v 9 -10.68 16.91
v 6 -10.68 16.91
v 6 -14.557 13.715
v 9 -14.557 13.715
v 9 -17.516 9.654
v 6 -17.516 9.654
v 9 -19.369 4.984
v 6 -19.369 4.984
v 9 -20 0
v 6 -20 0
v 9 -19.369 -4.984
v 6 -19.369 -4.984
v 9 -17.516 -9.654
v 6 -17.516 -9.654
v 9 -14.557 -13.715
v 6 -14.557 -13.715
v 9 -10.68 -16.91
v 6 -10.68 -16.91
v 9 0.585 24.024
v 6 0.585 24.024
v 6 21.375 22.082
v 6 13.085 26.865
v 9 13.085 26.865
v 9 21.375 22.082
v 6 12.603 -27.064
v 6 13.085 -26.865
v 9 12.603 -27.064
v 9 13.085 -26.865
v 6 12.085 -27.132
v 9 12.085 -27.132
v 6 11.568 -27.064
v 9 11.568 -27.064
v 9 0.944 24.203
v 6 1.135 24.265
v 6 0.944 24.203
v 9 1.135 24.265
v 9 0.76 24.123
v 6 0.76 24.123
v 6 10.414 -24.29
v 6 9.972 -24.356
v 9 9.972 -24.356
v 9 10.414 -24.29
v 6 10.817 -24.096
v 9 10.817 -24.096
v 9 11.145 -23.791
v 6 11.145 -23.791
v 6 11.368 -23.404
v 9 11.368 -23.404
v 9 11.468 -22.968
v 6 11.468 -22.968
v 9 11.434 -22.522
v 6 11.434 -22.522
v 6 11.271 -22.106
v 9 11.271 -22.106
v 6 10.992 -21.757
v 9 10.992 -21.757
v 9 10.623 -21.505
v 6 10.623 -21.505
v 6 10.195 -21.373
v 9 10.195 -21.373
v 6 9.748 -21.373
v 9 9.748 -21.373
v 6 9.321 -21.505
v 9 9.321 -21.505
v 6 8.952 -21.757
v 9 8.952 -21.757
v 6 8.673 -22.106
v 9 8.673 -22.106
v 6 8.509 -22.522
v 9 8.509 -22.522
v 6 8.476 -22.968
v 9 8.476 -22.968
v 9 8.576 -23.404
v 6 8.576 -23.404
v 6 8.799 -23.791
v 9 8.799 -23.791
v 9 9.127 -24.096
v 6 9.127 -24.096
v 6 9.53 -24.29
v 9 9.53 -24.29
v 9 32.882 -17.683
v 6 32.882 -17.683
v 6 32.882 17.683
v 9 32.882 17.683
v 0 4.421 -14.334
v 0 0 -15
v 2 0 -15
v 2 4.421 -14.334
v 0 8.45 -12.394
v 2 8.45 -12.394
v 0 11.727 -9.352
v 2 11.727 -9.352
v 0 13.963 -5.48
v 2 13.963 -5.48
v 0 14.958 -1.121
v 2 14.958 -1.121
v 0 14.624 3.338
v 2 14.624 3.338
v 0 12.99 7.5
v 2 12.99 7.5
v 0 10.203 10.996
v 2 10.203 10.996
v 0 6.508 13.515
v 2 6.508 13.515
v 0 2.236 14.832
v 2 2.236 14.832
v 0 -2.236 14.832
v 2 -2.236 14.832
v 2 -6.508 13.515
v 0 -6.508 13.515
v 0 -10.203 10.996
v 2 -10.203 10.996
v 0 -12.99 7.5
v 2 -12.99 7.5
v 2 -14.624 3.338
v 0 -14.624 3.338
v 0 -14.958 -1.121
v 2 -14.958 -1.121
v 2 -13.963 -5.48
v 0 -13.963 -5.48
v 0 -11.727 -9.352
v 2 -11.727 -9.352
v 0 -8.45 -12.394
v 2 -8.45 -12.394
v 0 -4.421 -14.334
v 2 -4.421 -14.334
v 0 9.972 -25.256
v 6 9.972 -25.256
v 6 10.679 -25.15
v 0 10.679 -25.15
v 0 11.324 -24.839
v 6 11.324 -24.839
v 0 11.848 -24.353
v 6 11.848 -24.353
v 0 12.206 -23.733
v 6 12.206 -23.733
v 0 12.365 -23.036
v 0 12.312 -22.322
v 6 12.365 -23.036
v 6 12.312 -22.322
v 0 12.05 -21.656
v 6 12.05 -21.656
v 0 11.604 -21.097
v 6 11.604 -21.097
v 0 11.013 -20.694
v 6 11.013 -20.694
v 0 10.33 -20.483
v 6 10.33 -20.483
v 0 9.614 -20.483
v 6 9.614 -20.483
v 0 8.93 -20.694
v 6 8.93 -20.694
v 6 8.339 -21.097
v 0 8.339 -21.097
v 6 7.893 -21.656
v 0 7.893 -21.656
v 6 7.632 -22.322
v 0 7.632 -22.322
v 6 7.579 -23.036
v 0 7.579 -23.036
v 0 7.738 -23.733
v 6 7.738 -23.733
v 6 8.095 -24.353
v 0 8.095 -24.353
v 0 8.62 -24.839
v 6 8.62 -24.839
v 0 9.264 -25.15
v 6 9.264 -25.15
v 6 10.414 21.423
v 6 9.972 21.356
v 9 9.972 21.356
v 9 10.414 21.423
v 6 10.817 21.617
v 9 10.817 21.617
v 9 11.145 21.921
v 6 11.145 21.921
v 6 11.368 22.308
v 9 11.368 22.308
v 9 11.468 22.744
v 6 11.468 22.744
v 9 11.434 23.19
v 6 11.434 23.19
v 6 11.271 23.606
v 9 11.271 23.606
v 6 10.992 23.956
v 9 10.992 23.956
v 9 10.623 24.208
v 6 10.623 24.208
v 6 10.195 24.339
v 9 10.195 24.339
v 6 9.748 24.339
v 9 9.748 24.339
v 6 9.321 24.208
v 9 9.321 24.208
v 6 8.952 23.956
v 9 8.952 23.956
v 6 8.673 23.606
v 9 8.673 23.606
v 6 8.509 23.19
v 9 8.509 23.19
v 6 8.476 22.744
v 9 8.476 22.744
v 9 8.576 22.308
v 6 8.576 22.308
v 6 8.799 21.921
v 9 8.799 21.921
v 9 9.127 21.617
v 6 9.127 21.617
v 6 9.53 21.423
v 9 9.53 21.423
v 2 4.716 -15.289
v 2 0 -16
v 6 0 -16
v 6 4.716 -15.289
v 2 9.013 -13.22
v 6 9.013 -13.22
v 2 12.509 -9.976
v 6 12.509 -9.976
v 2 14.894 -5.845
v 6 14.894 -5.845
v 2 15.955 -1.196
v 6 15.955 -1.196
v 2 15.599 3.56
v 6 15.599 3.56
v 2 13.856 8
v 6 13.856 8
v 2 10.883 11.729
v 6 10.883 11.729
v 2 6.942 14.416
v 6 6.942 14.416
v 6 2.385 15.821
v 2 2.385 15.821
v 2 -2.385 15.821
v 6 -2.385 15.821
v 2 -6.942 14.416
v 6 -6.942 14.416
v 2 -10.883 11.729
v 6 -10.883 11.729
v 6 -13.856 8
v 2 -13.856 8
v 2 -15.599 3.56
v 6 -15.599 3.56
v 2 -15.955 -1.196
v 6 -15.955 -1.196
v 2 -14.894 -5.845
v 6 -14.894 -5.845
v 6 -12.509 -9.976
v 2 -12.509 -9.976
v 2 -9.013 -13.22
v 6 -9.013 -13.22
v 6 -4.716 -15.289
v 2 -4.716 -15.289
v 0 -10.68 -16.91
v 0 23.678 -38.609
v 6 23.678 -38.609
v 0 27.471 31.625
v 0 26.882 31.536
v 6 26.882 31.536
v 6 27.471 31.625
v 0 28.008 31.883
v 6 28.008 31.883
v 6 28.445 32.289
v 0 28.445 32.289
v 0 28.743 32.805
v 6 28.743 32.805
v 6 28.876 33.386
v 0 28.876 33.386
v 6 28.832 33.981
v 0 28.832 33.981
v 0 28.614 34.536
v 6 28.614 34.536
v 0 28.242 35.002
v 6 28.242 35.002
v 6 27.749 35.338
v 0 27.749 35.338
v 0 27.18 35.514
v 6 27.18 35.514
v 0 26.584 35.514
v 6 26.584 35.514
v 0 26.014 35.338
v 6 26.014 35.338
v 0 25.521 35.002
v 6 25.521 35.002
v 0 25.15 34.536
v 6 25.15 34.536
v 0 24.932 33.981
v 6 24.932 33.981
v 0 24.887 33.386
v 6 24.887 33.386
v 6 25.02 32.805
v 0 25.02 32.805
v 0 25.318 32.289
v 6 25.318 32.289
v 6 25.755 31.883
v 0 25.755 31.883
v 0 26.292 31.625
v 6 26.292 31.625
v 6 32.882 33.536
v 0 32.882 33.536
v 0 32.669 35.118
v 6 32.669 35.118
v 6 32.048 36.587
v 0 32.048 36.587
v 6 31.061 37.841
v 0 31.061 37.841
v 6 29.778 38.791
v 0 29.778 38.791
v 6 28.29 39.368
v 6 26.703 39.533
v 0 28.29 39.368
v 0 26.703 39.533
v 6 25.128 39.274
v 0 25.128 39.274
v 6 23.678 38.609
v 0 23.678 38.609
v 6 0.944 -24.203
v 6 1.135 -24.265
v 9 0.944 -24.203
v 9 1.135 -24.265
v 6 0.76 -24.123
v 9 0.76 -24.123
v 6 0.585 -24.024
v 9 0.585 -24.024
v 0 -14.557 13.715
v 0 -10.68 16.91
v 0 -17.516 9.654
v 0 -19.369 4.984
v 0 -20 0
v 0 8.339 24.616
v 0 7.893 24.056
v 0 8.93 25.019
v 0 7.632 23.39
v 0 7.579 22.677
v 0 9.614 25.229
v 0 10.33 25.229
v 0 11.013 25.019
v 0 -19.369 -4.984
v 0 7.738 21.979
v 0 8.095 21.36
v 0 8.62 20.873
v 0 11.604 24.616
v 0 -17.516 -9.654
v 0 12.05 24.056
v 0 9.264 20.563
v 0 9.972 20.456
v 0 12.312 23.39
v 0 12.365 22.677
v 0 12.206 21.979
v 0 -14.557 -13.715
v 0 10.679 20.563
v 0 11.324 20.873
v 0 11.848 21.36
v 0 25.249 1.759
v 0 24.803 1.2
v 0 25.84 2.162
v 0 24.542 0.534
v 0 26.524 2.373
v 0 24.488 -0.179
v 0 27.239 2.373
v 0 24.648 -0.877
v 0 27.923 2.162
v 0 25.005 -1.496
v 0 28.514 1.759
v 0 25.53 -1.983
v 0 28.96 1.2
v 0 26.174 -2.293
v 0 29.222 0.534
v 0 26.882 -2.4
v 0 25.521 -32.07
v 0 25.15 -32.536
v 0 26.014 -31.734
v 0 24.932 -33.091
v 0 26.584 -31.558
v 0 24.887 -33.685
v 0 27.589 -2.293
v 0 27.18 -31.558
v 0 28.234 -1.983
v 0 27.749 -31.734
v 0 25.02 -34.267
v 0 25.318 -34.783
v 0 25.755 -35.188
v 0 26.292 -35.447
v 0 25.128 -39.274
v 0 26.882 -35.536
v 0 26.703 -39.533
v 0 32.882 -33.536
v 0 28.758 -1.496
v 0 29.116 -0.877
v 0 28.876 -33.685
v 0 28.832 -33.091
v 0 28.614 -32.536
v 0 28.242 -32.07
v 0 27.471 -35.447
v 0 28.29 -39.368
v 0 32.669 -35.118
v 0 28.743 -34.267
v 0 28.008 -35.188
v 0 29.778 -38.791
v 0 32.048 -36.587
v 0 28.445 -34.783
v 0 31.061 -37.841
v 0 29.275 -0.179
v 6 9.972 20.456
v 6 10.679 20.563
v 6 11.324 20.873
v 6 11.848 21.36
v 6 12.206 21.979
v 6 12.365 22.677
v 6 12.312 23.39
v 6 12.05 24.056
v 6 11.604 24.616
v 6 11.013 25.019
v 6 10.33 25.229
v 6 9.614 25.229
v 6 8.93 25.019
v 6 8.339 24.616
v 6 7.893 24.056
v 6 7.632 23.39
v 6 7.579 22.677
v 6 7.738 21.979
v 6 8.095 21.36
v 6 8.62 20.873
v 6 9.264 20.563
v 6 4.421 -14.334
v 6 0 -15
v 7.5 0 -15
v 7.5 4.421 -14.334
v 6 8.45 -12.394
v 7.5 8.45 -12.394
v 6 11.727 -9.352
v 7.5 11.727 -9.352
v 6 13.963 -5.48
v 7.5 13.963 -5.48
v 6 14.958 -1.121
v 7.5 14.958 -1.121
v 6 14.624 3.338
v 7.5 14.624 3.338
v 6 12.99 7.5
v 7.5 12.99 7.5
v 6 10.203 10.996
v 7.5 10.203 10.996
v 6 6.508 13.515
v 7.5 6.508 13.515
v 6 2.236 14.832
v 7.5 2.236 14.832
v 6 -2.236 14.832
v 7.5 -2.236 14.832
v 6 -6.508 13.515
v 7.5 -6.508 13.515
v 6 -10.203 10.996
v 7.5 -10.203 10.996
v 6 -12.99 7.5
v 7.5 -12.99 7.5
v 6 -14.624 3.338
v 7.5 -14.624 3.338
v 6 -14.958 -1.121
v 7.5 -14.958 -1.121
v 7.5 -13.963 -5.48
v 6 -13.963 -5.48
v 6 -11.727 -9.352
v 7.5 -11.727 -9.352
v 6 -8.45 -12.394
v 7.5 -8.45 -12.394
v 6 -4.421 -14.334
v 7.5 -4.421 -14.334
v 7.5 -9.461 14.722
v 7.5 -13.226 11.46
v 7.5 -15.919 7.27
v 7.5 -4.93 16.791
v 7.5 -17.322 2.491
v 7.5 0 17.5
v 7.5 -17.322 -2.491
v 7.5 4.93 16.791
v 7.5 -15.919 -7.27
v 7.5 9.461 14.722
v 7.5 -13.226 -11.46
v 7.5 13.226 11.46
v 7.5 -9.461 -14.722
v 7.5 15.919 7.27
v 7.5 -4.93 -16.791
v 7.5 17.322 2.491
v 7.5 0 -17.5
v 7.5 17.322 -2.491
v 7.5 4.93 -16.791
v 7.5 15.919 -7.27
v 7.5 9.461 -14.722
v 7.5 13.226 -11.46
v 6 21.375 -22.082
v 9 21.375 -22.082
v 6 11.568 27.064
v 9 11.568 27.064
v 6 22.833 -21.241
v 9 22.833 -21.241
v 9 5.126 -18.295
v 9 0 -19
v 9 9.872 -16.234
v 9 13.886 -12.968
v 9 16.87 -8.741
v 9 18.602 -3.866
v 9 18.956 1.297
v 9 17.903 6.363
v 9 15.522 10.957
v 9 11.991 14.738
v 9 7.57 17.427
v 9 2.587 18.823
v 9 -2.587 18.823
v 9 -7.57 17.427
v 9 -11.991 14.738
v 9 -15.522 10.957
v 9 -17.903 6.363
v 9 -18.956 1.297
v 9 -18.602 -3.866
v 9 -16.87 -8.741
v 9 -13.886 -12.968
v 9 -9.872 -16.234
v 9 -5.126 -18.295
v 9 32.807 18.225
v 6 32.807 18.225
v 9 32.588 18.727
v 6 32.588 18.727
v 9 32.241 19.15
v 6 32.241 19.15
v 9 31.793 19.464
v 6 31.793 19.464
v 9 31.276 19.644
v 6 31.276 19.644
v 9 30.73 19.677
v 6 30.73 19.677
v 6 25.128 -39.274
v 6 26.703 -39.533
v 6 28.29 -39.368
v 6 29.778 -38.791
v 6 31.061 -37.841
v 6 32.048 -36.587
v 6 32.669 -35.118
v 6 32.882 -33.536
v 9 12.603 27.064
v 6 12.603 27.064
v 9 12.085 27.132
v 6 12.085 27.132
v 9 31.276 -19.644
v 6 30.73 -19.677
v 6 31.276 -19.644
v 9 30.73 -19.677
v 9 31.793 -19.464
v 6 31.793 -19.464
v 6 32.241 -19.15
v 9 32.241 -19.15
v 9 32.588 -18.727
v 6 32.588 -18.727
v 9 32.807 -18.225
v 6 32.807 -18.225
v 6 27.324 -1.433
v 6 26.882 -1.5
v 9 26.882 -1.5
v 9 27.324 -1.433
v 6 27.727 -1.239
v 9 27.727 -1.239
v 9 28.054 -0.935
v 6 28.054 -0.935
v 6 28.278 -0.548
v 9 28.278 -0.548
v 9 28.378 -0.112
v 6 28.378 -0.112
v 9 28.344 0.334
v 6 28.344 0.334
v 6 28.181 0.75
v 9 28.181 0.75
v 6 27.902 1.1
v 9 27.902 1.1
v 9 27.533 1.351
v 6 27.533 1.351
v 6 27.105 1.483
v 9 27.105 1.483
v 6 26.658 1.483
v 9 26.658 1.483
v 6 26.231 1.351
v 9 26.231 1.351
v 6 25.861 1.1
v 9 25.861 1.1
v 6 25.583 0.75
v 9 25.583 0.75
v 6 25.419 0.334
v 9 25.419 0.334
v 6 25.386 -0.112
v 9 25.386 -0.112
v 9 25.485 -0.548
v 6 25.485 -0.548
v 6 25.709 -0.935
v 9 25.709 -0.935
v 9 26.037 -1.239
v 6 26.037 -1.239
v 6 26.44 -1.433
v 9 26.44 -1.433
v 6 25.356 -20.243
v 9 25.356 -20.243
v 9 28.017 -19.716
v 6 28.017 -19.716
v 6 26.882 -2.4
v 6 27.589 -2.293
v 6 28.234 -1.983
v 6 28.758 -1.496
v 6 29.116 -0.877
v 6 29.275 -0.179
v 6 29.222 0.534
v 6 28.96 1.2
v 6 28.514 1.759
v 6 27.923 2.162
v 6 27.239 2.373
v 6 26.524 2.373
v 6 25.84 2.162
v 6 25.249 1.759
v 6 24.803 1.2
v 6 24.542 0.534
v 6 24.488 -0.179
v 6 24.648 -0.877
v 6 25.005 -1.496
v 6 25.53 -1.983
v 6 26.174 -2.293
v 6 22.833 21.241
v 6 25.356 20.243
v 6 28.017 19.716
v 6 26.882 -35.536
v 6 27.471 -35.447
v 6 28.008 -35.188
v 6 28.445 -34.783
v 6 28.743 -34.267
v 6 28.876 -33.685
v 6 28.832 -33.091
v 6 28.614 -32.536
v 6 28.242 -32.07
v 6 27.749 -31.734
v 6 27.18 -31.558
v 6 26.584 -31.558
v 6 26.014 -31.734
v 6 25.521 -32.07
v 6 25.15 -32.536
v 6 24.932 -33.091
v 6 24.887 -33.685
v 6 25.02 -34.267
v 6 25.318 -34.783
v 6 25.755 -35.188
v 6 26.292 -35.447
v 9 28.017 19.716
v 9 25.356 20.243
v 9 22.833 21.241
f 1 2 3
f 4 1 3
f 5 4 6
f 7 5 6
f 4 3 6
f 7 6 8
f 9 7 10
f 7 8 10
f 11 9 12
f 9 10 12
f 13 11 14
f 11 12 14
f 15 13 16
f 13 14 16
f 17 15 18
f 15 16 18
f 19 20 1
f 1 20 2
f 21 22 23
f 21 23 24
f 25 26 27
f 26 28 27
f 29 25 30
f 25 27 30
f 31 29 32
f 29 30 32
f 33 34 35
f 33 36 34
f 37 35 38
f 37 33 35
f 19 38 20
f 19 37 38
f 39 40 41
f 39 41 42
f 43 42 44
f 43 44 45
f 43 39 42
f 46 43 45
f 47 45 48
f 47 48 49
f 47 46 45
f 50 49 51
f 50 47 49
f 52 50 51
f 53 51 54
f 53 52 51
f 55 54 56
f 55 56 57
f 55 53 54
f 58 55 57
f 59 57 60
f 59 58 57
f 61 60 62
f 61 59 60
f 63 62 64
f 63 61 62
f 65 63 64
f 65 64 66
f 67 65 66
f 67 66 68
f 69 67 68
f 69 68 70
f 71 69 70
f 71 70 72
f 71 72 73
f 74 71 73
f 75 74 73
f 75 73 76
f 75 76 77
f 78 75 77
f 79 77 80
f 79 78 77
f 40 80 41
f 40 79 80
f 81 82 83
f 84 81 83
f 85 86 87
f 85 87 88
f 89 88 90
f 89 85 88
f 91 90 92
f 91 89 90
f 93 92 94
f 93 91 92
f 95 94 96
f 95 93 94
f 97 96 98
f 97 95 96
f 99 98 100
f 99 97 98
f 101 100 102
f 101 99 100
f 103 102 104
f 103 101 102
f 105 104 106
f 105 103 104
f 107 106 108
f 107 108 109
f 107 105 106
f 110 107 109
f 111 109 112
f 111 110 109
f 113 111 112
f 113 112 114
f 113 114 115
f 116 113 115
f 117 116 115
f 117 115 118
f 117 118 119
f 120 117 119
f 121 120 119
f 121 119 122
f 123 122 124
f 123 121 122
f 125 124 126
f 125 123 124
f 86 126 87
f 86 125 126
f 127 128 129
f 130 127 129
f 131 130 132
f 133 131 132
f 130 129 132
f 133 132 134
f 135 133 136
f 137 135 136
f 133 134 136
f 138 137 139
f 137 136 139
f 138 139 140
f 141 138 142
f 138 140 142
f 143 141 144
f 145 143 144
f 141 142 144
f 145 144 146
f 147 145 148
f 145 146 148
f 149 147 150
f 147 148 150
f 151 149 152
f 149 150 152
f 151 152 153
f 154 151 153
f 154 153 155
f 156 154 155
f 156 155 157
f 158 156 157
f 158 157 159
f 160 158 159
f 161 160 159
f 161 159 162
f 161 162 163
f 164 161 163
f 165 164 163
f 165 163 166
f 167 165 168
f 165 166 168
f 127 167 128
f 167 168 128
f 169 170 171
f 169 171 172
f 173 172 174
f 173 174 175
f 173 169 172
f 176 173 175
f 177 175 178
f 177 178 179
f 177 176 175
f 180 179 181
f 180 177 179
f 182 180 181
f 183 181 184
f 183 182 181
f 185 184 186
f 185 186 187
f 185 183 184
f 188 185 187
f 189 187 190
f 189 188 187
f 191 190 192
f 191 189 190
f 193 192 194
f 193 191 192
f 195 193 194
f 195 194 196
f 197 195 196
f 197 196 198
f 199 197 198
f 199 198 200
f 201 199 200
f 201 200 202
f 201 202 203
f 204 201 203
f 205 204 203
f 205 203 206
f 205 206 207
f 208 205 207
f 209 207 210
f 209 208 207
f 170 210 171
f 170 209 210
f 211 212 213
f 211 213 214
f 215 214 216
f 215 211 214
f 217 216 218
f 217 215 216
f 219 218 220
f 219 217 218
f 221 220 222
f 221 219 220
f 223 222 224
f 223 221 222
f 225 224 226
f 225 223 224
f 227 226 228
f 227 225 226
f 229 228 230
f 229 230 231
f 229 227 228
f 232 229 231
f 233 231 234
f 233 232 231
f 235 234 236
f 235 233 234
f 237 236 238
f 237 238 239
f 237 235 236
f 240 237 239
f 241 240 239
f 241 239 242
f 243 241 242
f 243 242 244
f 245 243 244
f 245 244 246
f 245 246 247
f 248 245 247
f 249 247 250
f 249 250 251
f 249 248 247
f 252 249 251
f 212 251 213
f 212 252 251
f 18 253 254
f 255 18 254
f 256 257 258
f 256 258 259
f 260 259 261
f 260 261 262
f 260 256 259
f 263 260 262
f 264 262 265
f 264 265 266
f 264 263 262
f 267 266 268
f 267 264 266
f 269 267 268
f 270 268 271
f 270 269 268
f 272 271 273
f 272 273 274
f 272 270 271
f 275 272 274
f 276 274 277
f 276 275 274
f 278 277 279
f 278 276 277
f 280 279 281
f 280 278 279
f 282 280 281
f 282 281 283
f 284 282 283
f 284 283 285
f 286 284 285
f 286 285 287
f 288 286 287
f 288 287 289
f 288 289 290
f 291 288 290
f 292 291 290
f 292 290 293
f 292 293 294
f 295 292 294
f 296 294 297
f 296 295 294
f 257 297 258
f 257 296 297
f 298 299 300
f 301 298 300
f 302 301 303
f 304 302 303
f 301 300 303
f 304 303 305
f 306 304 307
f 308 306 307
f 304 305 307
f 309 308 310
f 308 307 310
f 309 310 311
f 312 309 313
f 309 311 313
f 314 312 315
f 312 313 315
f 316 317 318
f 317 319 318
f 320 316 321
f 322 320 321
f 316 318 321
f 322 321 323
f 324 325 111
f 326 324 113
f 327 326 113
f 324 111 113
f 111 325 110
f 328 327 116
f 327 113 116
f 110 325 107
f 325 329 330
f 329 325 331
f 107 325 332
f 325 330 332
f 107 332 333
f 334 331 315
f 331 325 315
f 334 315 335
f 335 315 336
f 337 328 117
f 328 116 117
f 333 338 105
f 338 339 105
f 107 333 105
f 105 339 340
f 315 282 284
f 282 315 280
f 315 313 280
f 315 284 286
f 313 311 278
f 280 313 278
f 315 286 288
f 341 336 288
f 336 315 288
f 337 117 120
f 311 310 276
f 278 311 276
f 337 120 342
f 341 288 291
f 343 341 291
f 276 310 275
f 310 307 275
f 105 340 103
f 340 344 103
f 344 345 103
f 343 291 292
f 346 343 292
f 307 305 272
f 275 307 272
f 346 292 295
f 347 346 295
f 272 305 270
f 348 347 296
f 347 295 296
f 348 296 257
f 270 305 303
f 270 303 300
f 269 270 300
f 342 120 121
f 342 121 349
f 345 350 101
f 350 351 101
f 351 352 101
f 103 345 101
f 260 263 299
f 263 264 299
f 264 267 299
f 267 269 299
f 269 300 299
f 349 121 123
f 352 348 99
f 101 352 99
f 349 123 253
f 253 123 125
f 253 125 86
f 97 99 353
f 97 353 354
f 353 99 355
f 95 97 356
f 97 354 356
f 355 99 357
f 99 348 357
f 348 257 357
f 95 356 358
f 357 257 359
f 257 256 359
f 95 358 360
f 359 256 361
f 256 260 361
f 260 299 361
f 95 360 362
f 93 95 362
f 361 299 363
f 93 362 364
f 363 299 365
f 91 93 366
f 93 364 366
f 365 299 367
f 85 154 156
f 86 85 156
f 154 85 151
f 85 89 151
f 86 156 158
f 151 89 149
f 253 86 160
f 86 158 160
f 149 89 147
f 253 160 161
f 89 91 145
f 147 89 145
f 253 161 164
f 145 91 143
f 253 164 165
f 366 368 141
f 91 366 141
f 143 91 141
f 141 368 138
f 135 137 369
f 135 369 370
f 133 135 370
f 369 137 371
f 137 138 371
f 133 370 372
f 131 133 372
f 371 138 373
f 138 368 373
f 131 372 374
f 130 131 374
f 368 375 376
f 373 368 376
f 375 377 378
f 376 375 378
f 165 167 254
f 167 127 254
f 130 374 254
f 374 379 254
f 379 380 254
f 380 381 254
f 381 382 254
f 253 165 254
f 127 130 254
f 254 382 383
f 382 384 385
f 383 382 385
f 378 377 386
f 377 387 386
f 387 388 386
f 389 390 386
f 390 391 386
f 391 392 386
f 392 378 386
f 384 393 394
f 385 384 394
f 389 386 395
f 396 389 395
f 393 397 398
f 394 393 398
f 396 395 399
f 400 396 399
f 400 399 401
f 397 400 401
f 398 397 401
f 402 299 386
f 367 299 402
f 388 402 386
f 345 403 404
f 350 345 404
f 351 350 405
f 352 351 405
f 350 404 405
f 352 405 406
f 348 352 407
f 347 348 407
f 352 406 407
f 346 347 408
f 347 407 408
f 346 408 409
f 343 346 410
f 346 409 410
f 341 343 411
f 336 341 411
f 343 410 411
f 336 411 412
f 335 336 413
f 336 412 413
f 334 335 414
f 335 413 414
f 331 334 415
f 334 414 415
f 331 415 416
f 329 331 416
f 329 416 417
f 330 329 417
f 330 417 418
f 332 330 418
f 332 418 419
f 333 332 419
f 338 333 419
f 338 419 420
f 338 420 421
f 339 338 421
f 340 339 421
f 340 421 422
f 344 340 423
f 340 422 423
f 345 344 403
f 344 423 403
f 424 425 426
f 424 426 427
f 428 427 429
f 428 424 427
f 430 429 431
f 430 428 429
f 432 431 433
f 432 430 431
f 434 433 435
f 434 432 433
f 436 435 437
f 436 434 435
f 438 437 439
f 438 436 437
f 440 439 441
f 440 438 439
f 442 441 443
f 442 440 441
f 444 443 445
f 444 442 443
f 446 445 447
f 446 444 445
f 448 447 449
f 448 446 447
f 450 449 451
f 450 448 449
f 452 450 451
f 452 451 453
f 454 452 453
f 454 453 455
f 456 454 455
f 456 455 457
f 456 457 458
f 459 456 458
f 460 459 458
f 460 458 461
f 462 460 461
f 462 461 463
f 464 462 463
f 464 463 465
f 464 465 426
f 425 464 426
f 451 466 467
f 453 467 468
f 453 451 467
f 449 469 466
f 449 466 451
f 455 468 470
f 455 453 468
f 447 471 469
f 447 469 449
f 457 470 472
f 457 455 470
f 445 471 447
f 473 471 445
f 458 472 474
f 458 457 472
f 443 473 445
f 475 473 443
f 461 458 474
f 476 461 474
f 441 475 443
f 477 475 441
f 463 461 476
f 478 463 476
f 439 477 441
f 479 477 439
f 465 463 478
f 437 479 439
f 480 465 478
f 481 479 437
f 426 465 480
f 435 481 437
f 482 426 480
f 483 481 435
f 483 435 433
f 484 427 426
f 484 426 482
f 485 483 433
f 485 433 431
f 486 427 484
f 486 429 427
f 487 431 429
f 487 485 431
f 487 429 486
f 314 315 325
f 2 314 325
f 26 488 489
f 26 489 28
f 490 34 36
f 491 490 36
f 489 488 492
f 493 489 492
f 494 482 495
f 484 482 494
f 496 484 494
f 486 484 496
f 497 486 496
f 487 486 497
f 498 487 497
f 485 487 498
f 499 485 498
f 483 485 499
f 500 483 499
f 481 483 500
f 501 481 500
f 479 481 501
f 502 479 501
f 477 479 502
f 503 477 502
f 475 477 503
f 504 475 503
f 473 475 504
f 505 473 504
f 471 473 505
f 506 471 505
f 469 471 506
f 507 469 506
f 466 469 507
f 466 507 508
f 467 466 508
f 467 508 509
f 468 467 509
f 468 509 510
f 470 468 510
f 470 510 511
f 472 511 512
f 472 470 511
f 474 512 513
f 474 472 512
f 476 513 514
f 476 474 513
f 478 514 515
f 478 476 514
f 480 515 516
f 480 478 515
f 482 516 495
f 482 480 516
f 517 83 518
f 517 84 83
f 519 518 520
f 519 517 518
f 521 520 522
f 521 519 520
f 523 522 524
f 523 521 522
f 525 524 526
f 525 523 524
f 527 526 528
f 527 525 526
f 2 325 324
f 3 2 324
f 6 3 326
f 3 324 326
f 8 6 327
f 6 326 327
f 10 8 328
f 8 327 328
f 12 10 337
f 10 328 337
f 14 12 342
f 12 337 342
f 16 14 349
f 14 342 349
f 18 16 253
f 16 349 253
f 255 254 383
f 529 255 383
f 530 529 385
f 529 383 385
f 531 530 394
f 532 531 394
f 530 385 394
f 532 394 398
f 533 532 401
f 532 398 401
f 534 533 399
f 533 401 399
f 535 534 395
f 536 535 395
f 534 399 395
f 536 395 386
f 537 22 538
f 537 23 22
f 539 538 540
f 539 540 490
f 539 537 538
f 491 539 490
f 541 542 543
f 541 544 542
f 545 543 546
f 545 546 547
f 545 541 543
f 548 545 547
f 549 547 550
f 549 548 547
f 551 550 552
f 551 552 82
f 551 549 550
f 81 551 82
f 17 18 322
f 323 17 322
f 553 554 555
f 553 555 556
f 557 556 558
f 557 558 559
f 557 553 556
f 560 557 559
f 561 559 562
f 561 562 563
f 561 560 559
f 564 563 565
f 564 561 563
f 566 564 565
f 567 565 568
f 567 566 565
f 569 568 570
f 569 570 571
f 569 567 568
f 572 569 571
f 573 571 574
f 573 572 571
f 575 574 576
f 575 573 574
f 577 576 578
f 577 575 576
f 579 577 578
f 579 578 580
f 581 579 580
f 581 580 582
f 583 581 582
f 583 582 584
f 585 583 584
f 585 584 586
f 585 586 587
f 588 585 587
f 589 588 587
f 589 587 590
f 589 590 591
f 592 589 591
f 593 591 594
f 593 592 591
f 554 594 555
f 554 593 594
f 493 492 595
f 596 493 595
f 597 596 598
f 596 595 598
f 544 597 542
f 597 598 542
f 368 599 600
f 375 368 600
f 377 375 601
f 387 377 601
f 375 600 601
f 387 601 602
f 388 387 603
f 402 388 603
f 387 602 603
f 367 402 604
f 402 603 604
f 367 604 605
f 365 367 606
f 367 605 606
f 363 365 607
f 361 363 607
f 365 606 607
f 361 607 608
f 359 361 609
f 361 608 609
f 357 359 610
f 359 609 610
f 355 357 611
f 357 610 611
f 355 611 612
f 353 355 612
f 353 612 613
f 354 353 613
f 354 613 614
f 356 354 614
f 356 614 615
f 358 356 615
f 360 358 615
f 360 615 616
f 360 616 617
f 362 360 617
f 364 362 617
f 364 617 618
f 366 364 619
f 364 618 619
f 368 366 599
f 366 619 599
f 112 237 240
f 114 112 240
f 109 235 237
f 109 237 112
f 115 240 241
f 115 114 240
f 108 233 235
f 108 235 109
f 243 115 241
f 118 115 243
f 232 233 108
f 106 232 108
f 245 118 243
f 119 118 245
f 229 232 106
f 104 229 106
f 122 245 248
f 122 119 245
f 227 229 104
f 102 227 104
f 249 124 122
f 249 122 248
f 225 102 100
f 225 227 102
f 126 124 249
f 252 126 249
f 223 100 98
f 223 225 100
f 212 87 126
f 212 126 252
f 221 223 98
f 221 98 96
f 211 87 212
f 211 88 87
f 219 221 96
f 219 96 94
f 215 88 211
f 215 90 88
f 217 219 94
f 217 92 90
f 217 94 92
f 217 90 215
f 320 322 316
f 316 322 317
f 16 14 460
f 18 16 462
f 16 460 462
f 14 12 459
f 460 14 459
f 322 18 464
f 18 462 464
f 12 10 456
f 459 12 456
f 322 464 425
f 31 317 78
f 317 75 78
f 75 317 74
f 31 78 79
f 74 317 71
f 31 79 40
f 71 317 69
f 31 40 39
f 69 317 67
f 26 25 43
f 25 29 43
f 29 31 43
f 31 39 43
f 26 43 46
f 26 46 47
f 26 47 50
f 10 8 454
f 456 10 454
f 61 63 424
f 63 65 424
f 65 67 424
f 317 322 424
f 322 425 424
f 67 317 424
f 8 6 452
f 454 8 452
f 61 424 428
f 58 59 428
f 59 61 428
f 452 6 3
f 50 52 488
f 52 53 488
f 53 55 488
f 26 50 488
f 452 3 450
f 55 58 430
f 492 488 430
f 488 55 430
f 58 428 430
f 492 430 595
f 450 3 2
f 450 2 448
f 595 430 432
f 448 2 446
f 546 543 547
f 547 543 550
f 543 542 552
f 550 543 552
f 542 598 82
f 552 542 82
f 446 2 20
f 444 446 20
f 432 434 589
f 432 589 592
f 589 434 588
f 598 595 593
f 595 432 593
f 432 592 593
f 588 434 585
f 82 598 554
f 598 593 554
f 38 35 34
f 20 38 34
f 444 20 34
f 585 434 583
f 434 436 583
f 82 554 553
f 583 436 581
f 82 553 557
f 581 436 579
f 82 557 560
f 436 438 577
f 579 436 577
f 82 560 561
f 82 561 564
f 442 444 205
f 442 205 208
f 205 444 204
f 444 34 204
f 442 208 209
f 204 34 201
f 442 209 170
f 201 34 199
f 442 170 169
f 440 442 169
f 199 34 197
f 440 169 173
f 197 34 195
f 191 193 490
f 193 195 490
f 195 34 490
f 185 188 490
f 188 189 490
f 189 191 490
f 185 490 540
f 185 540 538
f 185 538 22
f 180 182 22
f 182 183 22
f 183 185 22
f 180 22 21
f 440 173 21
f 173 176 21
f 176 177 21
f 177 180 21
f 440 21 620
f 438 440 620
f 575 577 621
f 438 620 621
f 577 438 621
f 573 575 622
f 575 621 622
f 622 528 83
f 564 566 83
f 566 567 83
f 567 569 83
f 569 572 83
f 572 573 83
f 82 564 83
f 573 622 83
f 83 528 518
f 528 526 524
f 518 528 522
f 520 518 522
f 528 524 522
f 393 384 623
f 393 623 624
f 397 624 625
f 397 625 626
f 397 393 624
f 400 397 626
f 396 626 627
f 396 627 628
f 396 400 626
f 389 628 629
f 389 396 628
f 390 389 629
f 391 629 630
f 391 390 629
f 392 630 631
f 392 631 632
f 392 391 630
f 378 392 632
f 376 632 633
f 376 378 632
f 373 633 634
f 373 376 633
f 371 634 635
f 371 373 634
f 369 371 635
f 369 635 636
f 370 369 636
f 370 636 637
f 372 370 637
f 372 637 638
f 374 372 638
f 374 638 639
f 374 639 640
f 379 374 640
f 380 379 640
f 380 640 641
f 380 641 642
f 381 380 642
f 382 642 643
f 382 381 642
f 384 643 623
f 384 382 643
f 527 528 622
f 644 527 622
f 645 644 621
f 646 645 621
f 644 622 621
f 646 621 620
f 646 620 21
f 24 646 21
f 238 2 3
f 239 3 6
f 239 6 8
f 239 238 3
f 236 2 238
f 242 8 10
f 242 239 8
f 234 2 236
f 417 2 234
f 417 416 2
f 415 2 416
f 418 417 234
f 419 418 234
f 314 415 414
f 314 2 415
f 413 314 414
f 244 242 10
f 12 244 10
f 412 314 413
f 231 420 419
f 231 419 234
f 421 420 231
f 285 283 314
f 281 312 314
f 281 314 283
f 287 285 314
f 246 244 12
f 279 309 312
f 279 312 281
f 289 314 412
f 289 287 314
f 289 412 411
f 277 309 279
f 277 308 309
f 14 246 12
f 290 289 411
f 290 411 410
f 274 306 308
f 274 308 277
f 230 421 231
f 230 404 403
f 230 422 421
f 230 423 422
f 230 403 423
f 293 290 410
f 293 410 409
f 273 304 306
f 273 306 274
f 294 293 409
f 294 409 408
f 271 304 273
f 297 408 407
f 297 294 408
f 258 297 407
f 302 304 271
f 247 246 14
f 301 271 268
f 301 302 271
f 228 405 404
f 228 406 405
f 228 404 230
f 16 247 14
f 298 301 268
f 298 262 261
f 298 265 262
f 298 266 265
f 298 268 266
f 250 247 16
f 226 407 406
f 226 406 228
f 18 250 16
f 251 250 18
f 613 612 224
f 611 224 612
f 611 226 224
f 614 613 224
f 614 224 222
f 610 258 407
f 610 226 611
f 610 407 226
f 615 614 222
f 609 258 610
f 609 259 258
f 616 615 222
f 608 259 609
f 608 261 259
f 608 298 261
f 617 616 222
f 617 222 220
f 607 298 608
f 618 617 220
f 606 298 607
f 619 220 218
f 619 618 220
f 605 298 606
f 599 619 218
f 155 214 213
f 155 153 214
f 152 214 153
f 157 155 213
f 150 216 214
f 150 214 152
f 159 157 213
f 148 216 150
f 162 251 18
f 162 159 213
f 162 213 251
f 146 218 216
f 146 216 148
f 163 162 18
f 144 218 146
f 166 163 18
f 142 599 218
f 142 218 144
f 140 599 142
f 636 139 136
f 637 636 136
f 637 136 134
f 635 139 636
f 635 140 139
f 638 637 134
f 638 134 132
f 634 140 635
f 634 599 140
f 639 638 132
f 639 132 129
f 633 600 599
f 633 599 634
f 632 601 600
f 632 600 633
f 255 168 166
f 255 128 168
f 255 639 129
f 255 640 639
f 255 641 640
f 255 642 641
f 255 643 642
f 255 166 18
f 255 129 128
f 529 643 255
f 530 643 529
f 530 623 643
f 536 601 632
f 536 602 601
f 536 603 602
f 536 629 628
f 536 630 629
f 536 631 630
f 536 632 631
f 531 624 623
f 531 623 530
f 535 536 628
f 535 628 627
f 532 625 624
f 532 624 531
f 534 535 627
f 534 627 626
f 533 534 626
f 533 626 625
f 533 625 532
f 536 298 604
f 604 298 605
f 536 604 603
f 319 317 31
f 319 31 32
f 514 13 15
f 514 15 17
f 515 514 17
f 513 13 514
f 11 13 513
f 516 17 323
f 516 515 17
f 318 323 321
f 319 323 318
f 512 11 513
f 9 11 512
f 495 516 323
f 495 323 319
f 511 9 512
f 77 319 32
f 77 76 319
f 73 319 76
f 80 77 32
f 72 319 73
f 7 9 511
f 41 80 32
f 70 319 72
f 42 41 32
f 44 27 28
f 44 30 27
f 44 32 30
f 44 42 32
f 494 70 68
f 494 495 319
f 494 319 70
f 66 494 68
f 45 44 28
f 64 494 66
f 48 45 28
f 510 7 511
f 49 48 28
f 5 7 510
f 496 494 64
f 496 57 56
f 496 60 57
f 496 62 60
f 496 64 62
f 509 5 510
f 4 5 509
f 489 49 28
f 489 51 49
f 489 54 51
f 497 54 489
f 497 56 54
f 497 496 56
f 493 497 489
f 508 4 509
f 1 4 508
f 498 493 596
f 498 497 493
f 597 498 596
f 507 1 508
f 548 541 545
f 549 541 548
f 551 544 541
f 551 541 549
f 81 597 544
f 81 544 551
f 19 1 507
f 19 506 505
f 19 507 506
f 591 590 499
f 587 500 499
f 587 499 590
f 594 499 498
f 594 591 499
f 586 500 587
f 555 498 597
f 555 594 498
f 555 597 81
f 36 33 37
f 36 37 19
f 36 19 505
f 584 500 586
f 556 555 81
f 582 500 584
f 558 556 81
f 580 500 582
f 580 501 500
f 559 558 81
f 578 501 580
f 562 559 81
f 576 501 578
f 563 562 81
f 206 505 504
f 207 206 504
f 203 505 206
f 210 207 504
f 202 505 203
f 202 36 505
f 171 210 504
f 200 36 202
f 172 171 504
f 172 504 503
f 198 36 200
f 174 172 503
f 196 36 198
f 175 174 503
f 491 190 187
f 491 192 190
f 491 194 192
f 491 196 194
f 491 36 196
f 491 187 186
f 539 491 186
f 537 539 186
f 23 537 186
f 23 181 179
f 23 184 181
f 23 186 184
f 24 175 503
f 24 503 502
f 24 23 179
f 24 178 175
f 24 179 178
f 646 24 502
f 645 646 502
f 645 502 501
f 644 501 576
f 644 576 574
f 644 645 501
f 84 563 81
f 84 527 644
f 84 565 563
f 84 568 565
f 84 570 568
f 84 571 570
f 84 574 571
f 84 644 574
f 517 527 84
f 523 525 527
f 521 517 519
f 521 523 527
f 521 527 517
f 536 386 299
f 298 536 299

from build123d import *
from OCP.BRepFilletAPI import BRepFilletAPI_MakeChamfer

# Parameters (mm, degrees)
SKETCH1_R           = 20
SKETCH1_R_2         = 15
BOSS_EXTRUDE1_DEPTH = 2
SKETCH2_R           = 20
SKETCH2_R_2         = 16
BOSS_EXTRUDE2_DEPTH = 4
BOSS_EXTRUDE3_START = -6
SKETCH3_R           = 2
BOSS_EXTRUDE3_DEPTH = 6
SKETCH4_R           = 2.4
CUT_EXTRUDE1_DEPTH  = 6
SKETCH5_R           = 15
SKETCH5_R_2         = 1.5
BOSS_EXTRUDE4_DEPTH = 3
FILLET1_R           = 2
CUT_EXTRUDE2_START  = -1.5
SKETCH6_R           = 17.5
SKETCH6_R_2         = 15
CUT_EXTRUDE2_DEPTH  = 1.5
CHAMFER1_SIZE       = 1.5
CHAMFER2_START      = 6
CHAMFER2_DEPTH      = 3
CHAMFER2_2_DEPTH    = 3
CHAMFER3_SIZE       = 4
CHAMFER3_SIZE2      = 9.534572009
FILLET2_R           = 2


with BuildPart() as part:
    # Sketch1 → Boss-Extrude1 (new body)
    with BuildSketch(Plane(origin=(0, 0, 0), x_dir=(0, 0, -1), z_dir=(1, 0, 0))):
        Circle(SKETCH1_R)
        Circle(SKETCH1_R_2, mode=Mode.SUBTRACT)
    extrude(amount=BOSS_EXTRUDE1_DEPTH)

    # Sketch2 → Boss-Extrude2 (add)
    with BuildSketch(Plane(origin=(2, 0, 0), x_dir=(0, 0, -1), z_dir=(1, 0, 0))):
        Circle(SKETCH2_R)
        Circle(SKETCH2_R_2, mode=Mode.SUBTRACT)
    extrude(amount=BOSS_EXTRUDE2_DEPTH)

    # Sketch3 → Boss-Extrude3 (add)
    with BuildSketch(Plane(origin=(6, 0, 0), x_dir=(0, 0, -1), z_dir=(1, 0, 0)).offset(BOSS_EXTRUDE3_START)):
        with BuildLine():
            Line((-38.608830959, 23.677807584), (-16.909895057, -10.679674581))
            ThreePointArc((-16.909895057, -10.679674581), (0, 20), (16.909895057, -10.679674581))
            Line((16.909895057, -10.679674581), (38.608830959, 23.677807584))
            ThreePointArc((38.608830959, 23.677807584), (38.790546744, 29.777964933), (33.535862442, 32.881709959))
            Line((33.535862442, 32.881709959), (-33.535862442, 32.881709959))
            ThreePointArc((-33.535862442, 32.881709959), (-38.790546744, 29.777964933), (-38.608830959, 23.677807584))
        make_face()
        with Locations((-33.535862442, 26.881709959)):
            Circle(SKETCH3_R, mode=Mode.SUBTRACT)
        with Locations((33.535862442, 26.881709959)):
            Circle(SKETCH3_R, mode=Mode.SUBTRACT)
    extrude(amount=BOSS_EXTRUDE3_DEPTH)

    # Sketch4 → Cut-Extrude1 (cut)
    with BuildSketch(Plane(origin=(6, 0, 0), x_dir=(0, 0, -1), z_dir=(1, 0, 0))):
        with Locations((-22.856187861, 9.971814902)):
            Circle(SKETCH4_R)
        with Locations((22.856187861, 9.971814902)):
            Circle(SKETCH4_R)
        with Locations((0, 26.881709959)):
            Circle(SKETCH4_R)
    extrude(amount=-CUT_EXTRUDE1_DEPTH, mode=Mode.SUBTRACT)


with BuildPart() as body_2:
    # Sketch5 → Boss-Extrude4 (new body)
    with BuildSketch(Plane(origin=(6, 0, 0), x_dir=(0, 0, -1), z_dir=(1, 0, 0))):
        with BuildLine():
            Line((16.909895057, -10.679674581), (32.929406929, 14.685168005))
            ThreePointArc((32.929406929, 14.685168005), (22.406301367, 20.899773925), (20, 32.881709959))
            Line((20, 32.881709959), (-20, 32.881709959))
            ThreePointArc((-20, 32.881709959), (-22.406301367, 20.899773925), (-32.929406929, 14.685168005))
            Line((-32.929406929, 14.685168005), (-16.909895057, -10.679674581))
            ThreePointArc((-16.909895057, -10.679674581), (0, -20), (16.909895057, -10.679674581))
        make_face()
        Circle(SKETCH5_R, mode=Mode.SUBTRACT)
        with Locations((-22.856187861, 9.971814902)):
            Circle(SKETCH5_R_2, mode=Mode.SUBTRACT)
        with Locations((0, 26.881709959)):
            Circle(SKETCH5_R_2, mode=Mode.SUBTRACT)
        with Locations((22.856187861, 9.971814902)):
            Circle(SKETCH5_R_2, mode=Mode.SUBTRACT)
    extrude(amount=BOSS_EXTRUDE4_DEPTH)

    # Fillet1
    fillet1_edges = [body_2.edges().sort_by_distance(p)[0] for p in [
        (7.5, 32.881709959, 20),
        (7.5, 32.881709959, -20),
    ]]
    fillet(fillet1_edges, radius=FILLET1_R)

    # Sketch6 → Cut-Extrude2 (cut)
    with BuildSketch(Plane(origin=(9, 0, 0), x_dir=(0, 0, -1), z_dir=(1, 0, 0)).offset(CUT_EXTRUDE2_START)):
        Circle(SKETCH6_R)
        Circle(SKETCH6_R_2, mode=Mode.SUBTRACT)
    extrude(amount=CUT_EXTRUDE2_DEPTH, mode=Mode.SUBTRACT)

    # Chamfer1
    chamfer1_edges = [body_2.edges().sort_by_distance(p)[0] for p in [
        (9, 0, 17.5),
    ]]
    chamfer(chamfer1_edges, length=CHAMFER1_SIZE - 0.0001)  # a hair under: the kernel refuses the full size

    # Chamfer2: read off the stored shape, not the designer's step
    # Chamfer2 outline → Chamfer2 (cut)
    with BuildSketch(Plane.YZ.offset(CHAMFER2_START)):
        with BuildLine():
            ThreePointArc((14.685168005, -32.929406929), (16.820809532, -26.759995627), (21.374989761, -22.082171028))
            Line((21.374989761, -22.082171028), (8.902916658, -29.277547321))
            Line((8.902916658, -29.277547321), (14.685168005, -32.929406929))
        make_face()
        with BuildLine():
            Line((14.685168005, 32.929406929), (8.902916658, 29.277547321))
            Line((8.902916658, 29.277547321), (21.374989761, 22.082171028))
            ThreePointArc((21.374989761, 22.082171028), (16.820809532, 26.759995627), (14.685168005, 32.929406929))
        make_face()
    extrude(amount=CHAMFER2_DEPTH, mode=Mode.SUBTRACT)

    # Chamfer2 2 outline → Chamfer2 2 (add)
    with BuildSketch(Plane.YZ.offset(CHAMFER2_START)):
        with BuildLine():
            Line((21.374989761, -22.082171028), (22.833050026, -21.240988317))
            ThreePointArc((22.833050026, -21.240988317), (22.09221084, -21.641110503), (21.374989761, -22.082171028))
        make_face()
        with BuildLine():
            Line((22.833050026, 21.240988317), (21.374989761, 22.082171028))
            ThreePointArc((21.374989761, 22.082171028), (22.09221084, 21.641110503), (22.833050026, 21.240988317))
        make_face()
    extrude(amount=CHAMFER2_2_DEPTH)

    # Chamfer3: one chamfer whose edges measure the first distance from different faces: ONE call of the kernel's chamfer builder (chamfer() names one face for all edges)
    chamfer3_edges_1 = [body_2.edges().sort_by_distance(p)[0] for p in [
        (7.5, 8.902916658, -29.277547321),
    ]]
    chamfer3_side_1 = [body_2.faces().sort_by_distance(p)[0] for p in [
        (7.5, 15.13895321, -25.679859174),
    ]]
    chamfer3_edges_2 = [body_2.edges().sort_by_distance(p)[0] for p in [
        (7.5, 8.902916658, 29.277547321),
    ]]
    chamfer3_side_2 = [body_2.faces().sort_by_distance(p)[0] for p in [
        (7.5, 15.138953209, 25.679859174),
    ]]
    chamfer3 = BRepFilletAPI_MakeChamfer(body_2.part.solid().wrapped)
    for e in chamfer3_edges_1:
        chamfer3.Add(CHAMFER3_SIZE, CHAMFER3_SIZE2, e.wrapped, chamfer3_side_1[0].wrapped)  # the first distance lies on this face
    for e in chamfer3_edges_2:
        chamfer3.Add(CHAMFER3_SIZE, CHAMFER3_SIZE2, e.wrapped, chamfer3_side_2[0].wrapped)  # the first distance lies on this face
    add(Compound.cast(chamfer3.Shape()), mode=Mode.REPLACE)

    # Fillet2
    fillet2_edges = [body_2.edges().sort_by_distance(p)[0] for p in [
        (7.5, 0.841486054, -24.186241005),
        (7.5, 12.367665074, -27.278668032),
        (7.5, 0.841486054, 24.186241005),
        (7.5, 12.367665074, 27.278668032),
    ]]
    fillet(fillet2_edges, radius=FILLET2_R)


solid = Compound([part.part, body_2.part])
